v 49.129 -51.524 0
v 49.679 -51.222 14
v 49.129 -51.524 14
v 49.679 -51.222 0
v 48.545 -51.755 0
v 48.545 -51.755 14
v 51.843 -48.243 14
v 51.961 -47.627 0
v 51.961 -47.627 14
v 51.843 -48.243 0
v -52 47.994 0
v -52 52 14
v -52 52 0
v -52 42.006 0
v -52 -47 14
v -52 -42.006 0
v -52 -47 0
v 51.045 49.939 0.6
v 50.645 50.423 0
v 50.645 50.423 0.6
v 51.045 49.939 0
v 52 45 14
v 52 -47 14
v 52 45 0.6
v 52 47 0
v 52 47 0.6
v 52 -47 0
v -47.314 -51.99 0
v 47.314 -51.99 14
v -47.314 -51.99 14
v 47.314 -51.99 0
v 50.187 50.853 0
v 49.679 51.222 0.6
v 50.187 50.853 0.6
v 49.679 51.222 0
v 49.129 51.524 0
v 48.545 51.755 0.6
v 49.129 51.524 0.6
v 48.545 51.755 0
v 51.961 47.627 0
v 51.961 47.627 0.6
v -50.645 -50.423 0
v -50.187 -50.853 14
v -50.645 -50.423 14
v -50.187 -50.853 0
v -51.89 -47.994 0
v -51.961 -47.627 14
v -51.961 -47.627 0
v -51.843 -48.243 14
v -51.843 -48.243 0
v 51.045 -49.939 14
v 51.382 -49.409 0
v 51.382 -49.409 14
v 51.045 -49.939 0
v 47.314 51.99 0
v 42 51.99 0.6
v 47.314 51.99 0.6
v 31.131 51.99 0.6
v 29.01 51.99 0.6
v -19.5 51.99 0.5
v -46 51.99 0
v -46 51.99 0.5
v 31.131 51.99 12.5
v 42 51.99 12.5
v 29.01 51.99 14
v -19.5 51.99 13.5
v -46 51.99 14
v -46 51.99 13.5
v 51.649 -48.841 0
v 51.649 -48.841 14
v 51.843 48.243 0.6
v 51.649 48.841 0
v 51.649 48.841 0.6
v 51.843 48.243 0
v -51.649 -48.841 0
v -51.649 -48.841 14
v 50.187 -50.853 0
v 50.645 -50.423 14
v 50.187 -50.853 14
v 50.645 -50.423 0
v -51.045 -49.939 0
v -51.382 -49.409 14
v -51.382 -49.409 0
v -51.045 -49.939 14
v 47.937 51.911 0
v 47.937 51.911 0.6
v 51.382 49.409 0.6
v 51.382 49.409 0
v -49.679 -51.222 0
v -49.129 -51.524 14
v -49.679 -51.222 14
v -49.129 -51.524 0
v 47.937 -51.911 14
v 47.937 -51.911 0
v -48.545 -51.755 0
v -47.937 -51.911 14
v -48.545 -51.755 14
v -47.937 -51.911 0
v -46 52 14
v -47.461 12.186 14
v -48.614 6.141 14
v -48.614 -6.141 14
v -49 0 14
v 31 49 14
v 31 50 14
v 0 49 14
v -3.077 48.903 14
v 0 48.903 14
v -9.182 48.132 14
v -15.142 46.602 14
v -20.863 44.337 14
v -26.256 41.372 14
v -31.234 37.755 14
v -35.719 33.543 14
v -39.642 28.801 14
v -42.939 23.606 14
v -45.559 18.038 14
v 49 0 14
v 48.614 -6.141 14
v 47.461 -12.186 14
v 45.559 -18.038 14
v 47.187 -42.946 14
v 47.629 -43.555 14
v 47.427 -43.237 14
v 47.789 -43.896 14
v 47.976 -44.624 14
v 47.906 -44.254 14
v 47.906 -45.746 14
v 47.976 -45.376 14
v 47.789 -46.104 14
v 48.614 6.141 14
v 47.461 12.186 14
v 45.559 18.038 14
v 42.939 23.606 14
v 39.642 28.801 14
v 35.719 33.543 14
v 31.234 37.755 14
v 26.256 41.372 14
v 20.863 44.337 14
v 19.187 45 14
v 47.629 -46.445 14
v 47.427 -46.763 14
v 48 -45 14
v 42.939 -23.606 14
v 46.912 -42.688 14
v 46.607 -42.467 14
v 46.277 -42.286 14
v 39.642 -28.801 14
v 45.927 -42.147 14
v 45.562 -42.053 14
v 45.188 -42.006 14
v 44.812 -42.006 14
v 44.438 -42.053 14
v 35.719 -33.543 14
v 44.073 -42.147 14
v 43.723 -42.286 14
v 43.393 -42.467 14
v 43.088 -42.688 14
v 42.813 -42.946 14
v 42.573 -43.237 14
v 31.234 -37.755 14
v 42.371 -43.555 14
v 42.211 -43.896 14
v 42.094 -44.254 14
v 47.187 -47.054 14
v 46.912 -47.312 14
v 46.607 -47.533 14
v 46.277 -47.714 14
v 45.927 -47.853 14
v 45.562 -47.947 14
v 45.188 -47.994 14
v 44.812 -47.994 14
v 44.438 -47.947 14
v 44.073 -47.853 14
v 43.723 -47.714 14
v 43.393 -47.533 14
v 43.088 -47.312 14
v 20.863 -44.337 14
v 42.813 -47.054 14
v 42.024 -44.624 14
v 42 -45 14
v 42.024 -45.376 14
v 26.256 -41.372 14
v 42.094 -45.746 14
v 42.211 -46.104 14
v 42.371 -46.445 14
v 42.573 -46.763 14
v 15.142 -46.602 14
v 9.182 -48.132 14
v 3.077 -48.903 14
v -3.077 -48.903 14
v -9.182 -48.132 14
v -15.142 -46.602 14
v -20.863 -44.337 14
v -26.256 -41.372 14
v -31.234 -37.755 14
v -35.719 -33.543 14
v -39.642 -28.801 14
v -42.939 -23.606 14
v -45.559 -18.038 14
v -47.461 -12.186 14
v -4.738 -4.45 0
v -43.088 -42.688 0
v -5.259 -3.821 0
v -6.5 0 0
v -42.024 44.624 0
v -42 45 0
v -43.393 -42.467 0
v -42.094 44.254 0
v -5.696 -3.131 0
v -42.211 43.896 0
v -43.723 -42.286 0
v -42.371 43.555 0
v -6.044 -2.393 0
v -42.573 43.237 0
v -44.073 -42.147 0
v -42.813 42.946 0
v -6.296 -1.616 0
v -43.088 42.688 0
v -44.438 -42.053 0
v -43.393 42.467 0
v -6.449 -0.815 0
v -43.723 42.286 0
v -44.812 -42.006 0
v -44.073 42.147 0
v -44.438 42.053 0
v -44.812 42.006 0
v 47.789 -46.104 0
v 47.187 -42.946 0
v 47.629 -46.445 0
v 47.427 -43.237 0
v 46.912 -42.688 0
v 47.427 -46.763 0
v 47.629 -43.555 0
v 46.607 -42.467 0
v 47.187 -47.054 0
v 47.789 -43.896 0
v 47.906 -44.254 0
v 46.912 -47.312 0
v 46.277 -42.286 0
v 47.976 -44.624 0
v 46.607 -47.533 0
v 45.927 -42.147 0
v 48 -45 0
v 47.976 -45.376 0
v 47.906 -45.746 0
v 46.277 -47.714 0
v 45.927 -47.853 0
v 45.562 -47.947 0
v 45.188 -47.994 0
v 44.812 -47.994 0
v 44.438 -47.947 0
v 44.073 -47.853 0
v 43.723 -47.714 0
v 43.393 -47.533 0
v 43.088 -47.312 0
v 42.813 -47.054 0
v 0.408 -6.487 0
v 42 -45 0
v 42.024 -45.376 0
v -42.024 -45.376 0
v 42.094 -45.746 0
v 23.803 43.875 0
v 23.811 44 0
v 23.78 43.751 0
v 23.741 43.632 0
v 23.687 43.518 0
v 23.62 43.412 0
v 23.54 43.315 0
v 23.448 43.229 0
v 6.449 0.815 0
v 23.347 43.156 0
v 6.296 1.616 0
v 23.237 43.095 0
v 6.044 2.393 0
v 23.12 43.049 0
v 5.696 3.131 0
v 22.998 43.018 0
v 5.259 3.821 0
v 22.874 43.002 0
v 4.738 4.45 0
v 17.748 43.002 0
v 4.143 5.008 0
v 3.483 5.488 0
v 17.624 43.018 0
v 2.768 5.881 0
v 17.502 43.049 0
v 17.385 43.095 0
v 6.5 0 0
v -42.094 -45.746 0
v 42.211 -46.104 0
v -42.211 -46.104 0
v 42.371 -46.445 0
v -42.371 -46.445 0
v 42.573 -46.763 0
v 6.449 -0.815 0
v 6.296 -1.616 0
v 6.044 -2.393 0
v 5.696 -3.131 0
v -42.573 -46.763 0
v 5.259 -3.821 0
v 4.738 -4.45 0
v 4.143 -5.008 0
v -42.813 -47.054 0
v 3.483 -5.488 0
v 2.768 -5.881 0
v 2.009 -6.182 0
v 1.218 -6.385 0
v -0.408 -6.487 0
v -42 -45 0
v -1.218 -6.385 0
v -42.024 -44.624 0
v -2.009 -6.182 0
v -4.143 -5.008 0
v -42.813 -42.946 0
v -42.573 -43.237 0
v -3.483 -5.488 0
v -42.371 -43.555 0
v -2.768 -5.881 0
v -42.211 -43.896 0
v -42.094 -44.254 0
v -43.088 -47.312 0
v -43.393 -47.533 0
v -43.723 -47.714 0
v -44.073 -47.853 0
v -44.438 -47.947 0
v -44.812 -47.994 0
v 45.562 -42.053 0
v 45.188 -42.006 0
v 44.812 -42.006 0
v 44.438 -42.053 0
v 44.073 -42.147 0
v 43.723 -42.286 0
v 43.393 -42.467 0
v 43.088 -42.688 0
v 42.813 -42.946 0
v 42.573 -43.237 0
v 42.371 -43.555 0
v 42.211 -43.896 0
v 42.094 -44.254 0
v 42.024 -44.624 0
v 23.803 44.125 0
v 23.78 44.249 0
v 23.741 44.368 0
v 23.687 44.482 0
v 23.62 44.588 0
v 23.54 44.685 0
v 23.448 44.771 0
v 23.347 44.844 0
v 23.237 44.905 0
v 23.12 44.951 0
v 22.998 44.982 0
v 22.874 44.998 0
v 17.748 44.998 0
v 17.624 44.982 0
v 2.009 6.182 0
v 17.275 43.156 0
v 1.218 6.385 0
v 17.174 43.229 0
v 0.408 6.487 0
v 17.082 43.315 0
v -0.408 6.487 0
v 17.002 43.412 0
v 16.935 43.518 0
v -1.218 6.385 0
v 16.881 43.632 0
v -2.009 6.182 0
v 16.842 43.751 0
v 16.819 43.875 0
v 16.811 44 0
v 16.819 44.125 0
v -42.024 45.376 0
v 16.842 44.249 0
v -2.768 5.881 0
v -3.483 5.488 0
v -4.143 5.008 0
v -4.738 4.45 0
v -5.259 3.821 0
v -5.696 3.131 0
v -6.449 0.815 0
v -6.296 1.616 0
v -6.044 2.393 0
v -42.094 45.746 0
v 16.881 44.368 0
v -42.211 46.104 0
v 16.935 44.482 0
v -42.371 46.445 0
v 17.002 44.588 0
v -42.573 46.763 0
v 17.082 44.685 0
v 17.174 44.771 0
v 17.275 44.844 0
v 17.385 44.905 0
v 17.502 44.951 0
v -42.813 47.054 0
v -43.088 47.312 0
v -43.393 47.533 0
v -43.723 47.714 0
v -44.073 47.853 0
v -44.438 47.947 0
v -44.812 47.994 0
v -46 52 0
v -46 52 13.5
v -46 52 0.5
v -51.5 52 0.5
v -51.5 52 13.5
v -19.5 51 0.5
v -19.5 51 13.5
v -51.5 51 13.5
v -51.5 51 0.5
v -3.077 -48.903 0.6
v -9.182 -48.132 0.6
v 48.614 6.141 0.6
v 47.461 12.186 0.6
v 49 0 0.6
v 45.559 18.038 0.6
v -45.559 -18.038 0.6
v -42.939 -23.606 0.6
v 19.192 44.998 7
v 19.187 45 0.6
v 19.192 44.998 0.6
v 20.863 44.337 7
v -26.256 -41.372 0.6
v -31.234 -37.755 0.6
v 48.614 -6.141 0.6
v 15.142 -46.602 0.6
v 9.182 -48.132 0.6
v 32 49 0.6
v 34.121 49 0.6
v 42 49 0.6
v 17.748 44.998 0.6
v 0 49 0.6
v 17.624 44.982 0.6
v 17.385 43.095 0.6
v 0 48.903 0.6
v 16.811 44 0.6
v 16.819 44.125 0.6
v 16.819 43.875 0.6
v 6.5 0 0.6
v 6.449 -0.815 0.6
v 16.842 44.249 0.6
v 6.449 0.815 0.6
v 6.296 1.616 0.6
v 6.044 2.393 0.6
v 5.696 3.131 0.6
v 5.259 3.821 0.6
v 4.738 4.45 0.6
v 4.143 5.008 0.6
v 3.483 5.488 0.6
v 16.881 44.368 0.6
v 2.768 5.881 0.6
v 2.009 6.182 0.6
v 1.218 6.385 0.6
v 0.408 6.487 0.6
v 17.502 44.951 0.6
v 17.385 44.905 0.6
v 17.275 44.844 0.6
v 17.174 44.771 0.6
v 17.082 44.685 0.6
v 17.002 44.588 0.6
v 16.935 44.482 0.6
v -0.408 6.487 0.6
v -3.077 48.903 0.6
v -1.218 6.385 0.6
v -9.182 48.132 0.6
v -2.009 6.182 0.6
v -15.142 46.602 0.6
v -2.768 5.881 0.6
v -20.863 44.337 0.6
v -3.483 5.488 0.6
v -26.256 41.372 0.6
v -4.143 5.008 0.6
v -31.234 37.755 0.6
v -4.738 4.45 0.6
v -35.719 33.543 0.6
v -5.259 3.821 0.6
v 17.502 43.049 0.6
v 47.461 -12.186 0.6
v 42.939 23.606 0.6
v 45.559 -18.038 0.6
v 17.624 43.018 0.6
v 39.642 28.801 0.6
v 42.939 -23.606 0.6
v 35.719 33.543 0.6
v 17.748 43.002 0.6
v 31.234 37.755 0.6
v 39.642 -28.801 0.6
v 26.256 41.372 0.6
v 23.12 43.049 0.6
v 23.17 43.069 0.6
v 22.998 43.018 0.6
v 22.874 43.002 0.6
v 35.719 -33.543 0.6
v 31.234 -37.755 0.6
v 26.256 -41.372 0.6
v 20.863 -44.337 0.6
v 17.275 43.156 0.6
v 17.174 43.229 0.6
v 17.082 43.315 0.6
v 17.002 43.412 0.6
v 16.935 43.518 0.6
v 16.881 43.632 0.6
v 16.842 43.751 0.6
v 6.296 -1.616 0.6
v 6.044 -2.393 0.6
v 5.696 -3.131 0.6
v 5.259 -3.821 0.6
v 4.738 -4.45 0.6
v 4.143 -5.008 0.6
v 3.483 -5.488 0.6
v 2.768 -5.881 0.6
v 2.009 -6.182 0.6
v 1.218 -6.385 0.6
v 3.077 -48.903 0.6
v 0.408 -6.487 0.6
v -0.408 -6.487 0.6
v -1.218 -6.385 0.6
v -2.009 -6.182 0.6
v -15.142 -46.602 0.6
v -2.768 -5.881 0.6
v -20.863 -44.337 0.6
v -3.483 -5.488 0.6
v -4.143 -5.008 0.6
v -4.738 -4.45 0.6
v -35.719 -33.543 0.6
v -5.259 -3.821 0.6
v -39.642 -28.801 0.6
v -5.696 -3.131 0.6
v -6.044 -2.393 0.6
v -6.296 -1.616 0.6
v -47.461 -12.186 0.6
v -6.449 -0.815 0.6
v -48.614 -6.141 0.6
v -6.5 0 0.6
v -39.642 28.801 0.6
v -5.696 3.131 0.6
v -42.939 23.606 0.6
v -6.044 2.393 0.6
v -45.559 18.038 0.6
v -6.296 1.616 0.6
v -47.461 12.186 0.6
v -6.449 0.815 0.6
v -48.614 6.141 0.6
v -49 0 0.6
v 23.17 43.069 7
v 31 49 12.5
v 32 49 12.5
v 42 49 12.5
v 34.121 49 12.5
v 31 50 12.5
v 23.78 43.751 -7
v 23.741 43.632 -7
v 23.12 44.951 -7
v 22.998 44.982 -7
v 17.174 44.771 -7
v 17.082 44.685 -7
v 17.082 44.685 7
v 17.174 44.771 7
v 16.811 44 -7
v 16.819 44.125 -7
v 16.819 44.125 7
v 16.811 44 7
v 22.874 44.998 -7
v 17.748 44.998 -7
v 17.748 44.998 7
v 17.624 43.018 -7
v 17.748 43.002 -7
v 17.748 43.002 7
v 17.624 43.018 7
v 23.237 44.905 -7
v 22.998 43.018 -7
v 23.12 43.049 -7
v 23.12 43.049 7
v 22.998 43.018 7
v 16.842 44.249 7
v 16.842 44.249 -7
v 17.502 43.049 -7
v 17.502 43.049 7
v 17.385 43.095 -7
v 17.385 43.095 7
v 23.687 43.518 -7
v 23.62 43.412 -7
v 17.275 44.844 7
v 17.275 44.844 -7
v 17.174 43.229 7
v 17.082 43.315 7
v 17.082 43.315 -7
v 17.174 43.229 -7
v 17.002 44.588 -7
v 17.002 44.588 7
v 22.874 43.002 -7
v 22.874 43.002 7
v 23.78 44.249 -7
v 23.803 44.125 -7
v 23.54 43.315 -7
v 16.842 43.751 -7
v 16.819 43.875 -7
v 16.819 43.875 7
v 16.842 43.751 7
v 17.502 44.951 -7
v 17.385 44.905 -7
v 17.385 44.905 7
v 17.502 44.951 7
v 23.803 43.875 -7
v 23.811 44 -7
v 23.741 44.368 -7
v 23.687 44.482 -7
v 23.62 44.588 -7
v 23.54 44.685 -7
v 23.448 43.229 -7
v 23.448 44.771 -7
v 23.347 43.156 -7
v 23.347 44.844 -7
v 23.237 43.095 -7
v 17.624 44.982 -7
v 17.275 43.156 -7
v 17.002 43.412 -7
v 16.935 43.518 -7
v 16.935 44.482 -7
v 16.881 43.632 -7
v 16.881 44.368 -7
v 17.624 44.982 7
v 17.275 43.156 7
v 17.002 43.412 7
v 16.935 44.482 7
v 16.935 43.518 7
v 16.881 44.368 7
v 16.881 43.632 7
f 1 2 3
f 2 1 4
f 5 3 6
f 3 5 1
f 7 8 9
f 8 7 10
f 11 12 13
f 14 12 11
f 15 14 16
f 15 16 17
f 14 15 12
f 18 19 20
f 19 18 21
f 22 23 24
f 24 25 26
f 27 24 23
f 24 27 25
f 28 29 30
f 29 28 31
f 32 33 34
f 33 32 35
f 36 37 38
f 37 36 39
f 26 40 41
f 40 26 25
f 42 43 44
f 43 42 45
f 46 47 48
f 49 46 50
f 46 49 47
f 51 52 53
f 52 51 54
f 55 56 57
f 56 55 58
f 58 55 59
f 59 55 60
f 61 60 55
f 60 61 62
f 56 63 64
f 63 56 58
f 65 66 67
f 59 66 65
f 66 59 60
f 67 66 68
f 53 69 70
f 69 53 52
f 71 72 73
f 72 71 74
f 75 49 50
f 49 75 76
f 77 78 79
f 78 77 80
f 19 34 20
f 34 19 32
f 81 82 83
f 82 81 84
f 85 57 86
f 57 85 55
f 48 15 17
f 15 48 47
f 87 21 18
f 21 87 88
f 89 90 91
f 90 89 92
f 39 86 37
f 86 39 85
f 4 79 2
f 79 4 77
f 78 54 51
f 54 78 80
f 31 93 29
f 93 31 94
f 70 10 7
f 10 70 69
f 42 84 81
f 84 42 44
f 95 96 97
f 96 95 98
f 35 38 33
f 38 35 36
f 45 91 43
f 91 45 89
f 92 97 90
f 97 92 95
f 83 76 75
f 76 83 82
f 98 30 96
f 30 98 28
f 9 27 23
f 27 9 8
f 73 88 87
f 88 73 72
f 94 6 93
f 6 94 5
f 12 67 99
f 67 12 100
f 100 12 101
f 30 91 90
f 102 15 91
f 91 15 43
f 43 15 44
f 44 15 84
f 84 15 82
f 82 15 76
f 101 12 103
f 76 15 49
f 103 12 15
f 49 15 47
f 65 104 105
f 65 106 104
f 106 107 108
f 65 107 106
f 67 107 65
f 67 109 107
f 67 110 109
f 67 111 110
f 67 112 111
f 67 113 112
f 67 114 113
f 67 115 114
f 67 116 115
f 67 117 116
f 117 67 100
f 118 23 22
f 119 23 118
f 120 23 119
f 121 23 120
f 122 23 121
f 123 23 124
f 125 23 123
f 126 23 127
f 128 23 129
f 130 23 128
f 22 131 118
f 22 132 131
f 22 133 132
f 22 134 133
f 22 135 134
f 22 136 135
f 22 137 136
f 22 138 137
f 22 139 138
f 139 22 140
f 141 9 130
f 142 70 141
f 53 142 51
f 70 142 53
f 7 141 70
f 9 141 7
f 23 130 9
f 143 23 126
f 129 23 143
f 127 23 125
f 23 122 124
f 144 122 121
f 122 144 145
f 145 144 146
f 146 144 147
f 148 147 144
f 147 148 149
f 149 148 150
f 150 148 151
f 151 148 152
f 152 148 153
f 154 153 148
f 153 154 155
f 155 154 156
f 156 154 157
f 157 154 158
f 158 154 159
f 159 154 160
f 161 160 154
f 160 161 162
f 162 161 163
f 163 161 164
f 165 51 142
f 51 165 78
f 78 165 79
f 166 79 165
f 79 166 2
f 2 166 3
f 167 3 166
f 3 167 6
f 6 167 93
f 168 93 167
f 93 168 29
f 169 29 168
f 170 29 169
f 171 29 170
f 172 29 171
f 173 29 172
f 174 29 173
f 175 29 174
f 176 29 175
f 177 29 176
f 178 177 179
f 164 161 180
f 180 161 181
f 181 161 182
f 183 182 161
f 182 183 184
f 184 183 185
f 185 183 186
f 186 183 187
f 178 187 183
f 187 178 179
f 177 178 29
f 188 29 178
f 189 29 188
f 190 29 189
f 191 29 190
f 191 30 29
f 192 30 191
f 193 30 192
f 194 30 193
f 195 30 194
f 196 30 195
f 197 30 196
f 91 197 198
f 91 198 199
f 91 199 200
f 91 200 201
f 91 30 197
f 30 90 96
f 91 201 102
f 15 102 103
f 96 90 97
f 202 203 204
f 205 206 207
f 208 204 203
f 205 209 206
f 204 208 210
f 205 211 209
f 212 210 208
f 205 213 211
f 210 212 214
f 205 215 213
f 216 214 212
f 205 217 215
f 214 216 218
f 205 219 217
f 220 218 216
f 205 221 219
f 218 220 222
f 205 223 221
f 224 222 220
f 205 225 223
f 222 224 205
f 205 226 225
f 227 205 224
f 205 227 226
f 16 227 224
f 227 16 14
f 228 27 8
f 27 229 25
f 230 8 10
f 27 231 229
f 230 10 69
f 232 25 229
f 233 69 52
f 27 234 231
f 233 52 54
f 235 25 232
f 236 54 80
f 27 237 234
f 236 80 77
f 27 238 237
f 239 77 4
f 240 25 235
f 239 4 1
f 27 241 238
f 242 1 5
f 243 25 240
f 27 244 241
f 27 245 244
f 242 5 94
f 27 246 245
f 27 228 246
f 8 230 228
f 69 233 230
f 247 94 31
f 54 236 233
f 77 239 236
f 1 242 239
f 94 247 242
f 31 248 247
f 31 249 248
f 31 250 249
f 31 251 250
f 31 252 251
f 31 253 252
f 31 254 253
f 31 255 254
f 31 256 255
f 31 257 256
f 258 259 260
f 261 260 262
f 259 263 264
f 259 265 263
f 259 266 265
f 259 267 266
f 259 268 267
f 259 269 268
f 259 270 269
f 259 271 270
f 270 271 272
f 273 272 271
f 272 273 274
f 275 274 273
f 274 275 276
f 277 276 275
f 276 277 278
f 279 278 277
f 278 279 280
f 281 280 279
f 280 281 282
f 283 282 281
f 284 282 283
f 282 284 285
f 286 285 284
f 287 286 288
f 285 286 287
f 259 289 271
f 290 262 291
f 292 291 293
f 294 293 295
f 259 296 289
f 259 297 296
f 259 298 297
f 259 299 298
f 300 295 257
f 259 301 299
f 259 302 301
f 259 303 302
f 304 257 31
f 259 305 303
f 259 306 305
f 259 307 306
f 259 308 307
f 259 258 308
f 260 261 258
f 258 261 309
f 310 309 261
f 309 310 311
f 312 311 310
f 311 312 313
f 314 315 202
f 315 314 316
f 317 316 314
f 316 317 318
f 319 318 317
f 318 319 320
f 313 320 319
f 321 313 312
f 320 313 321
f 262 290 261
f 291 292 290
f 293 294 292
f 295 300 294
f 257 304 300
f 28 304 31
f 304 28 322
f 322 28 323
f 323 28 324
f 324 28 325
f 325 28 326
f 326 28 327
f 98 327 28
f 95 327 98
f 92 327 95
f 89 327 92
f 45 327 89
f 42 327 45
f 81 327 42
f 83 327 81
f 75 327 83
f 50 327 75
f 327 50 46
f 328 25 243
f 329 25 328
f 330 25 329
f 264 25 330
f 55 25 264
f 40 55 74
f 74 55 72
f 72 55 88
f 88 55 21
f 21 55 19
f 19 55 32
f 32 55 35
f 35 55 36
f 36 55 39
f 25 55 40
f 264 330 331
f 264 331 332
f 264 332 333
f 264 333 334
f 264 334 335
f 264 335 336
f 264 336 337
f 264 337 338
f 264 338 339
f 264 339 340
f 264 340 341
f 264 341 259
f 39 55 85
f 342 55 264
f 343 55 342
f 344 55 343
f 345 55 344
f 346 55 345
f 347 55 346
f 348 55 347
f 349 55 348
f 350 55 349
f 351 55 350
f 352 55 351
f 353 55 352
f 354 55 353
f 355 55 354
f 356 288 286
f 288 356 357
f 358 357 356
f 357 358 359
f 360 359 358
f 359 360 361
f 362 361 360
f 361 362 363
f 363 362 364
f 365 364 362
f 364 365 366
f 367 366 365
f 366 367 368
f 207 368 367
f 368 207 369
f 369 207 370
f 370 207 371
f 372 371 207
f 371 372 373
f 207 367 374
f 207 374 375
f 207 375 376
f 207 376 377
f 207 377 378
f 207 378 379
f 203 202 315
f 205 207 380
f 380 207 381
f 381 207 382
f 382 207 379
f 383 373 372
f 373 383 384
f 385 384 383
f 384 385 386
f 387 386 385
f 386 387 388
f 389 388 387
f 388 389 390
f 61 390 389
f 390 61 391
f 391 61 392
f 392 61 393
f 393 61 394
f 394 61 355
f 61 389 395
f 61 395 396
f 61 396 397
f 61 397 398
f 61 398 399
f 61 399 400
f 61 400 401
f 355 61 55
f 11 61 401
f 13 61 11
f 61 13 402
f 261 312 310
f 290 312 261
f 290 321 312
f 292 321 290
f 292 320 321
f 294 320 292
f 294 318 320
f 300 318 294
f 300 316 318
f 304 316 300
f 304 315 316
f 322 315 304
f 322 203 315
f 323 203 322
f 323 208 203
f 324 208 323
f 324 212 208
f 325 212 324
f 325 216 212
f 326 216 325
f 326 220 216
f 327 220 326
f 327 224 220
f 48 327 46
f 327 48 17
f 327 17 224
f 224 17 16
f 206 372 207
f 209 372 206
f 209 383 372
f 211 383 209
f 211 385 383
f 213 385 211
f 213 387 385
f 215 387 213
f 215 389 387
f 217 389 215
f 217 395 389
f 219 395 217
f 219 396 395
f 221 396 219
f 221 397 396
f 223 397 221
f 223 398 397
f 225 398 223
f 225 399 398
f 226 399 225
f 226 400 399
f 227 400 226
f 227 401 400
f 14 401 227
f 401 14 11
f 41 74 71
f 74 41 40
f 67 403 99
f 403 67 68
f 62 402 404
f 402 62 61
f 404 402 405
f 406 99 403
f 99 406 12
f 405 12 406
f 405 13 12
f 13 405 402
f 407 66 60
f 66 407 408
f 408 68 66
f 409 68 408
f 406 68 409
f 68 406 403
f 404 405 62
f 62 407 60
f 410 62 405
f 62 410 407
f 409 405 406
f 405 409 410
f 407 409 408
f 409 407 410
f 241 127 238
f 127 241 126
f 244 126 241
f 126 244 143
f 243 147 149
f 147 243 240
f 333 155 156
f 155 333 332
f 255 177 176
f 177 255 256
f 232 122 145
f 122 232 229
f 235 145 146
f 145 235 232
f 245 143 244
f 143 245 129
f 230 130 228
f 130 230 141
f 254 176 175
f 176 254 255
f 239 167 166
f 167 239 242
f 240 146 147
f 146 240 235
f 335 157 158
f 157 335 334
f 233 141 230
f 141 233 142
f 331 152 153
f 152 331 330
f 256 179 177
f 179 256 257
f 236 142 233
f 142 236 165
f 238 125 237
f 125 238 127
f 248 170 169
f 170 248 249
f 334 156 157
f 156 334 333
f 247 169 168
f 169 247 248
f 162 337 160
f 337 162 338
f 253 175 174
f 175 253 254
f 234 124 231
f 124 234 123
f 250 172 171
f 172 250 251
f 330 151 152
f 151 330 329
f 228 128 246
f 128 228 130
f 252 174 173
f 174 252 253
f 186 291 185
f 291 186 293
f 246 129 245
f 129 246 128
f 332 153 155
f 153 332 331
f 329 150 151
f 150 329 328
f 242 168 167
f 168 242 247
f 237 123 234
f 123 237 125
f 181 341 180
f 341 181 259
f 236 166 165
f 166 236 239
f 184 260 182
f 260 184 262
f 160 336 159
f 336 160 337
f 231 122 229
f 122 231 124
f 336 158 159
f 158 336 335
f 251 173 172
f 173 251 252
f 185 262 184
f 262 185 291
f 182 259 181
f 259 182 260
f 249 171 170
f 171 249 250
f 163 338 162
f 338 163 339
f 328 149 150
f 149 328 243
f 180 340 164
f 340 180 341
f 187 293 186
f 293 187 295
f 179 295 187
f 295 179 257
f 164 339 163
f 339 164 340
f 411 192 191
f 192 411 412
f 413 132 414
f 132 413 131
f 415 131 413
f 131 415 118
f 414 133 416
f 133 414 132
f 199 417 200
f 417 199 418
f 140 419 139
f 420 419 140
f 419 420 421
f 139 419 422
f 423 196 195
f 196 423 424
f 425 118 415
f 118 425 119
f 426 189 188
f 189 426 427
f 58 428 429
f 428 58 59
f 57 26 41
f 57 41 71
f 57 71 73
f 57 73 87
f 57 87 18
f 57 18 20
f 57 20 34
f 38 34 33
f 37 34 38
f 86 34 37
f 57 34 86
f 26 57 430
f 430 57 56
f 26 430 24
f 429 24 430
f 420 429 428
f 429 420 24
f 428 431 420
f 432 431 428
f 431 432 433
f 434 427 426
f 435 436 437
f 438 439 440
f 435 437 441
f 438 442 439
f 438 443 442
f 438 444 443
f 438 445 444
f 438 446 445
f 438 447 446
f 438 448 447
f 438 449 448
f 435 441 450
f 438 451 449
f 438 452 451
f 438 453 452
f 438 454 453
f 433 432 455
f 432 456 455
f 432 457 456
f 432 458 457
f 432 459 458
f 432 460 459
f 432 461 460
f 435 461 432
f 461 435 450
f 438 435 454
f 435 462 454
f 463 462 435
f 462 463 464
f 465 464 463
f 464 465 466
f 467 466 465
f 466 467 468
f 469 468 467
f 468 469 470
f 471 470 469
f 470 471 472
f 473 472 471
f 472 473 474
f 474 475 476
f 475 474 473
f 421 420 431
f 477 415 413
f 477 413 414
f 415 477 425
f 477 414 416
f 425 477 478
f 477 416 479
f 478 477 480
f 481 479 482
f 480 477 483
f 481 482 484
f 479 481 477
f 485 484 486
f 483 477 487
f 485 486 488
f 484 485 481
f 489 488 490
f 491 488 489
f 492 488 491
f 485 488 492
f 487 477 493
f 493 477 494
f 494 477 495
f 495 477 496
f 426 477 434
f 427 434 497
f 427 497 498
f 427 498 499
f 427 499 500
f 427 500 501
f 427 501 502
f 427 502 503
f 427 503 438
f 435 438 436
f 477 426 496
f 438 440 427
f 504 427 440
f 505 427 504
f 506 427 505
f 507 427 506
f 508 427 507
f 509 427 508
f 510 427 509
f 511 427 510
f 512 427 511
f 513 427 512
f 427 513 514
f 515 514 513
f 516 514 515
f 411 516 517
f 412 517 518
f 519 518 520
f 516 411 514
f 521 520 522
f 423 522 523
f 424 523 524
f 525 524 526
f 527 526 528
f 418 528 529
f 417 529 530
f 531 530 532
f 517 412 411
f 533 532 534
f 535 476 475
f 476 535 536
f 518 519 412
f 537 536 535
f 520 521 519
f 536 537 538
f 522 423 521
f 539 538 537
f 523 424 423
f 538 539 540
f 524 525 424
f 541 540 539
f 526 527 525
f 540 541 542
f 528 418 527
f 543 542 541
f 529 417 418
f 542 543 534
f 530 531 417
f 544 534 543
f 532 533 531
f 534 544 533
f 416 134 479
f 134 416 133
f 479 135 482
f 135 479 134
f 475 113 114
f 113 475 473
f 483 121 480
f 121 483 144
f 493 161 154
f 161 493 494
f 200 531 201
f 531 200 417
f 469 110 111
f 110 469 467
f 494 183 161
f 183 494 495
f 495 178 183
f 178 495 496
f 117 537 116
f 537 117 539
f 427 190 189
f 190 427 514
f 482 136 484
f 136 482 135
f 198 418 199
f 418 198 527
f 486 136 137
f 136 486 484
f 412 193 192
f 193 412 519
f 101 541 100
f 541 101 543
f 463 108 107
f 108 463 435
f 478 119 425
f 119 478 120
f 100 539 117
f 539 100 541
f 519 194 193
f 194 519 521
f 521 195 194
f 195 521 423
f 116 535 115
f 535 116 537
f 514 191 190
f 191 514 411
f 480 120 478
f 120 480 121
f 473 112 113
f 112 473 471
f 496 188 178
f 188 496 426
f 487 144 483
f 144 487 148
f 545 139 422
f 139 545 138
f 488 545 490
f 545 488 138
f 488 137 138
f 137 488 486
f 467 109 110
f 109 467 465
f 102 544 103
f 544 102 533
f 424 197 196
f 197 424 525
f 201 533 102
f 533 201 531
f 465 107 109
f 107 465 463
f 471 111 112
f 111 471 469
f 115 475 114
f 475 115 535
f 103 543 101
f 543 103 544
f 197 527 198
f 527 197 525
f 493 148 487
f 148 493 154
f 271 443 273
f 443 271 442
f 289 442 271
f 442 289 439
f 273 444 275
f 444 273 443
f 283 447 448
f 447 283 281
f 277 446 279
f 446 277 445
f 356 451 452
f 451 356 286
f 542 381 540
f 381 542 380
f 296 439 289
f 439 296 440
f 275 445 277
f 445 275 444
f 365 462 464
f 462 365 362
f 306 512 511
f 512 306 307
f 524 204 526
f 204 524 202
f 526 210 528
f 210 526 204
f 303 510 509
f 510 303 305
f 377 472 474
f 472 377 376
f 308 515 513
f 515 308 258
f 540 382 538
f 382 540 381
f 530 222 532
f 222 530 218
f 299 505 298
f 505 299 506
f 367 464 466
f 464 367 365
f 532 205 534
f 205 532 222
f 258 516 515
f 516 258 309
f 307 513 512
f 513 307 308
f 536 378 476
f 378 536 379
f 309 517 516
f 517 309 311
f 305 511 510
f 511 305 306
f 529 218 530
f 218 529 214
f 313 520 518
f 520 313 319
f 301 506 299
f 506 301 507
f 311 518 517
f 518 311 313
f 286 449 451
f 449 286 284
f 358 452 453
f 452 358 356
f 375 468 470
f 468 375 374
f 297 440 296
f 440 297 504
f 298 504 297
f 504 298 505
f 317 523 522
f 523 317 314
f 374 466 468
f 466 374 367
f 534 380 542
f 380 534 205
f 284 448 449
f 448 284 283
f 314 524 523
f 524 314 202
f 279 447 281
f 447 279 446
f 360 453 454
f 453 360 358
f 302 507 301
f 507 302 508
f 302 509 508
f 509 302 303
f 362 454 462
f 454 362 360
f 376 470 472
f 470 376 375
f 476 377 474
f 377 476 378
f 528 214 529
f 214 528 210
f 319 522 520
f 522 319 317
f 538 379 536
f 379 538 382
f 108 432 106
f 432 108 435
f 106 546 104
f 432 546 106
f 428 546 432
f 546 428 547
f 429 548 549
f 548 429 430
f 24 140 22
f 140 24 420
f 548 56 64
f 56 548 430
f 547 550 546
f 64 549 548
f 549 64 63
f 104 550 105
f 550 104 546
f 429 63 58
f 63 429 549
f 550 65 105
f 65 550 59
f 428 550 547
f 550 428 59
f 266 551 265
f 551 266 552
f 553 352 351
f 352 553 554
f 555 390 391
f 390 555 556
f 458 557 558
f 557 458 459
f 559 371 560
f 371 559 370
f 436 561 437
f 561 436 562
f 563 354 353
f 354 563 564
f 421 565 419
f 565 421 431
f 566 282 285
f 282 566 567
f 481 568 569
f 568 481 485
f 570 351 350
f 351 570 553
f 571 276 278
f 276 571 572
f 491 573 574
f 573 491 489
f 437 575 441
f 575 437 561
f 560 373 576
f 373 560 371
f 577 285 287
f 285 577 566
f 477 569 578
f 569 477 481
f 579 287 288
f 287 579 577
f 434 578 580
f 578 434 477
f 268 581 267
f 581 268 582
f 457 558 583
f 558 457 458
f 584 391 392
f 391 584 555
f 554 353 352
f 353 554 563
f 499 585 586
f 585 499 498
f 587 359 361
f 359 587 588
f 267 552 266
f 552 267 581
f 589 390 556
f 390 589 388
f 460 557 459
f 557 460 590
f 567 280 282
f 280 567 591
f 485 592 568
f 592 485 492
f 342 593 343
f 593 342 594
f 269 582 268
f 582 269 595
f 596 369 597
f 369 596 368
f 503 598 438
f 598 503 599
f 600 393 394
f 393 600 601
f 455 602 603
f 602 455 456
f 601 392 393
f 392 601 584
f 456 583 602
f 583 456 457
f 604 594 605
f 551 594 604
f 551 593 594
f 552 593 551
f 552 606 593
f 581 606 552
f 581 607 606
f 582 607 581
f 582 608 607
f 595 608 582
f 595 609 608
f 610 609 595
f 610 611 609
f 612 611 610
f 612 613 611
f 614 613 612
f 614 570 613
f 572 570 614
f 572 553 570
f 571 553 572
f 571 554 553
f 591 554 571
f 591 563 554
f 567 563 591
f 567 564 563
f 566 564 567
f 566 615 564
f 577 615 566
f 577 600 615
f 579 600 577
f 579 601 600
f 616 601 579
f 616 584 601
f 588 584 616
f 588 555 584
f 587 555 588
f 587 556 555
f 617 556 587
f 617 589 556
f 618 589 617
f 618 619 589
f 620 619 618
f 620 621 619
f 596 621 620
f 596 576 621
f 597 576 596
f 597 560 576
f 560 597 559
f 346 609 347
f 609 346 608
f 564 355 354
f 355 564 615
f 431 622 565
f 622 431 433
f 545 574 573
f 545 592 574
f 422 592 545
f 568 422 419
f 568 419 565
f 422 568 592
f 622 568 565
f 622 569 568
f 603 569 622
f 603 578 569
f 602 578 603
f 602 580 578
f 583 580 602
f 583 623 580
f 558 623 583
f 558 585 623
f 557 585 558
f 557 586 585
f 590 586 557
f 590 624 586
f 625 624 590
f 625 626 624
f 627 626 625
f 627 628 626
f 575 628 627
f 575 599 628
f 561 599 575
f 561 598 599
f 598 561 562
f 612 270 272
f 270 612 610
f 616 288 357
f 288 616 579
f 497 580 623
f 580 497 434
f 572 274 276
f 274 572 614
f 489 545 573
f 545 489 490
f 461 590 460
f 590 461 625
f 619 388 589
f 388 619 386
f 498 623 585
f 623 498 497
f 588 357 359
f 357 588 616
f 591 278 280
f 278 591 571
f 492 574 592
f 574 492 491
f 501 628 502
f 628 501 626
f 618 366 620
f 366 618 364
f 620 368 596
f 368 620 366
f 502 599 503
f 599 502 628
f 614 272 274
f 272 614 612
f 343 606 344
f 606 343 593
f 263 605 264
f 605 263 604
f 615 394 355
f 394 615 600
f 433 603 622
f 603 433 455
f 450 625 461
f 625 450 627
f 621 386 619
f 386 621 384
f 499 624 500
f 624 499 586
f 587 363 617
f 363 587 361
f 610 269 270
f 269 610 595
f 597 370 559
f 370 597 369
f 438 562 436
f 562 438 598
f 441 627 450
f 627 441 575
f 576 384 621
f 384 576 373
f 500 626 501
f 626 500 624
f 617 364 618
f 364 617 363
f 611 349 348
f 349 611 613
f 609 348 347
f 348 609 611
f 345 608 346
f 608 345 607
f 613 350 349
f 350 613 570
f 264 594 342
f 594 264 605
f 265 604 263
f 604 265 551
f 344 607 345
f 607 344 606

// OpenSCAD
$fn = 50;


union() {
	difference() {
		union() {
			hull() {
				translate(v = [-47.0000000000, 47.0000000000, 0]) {
					cylinder(h = 14, r = 5);
				}
				translate(v = [47.0000000000, 47.0000000000, 0]) {
					cylinder(h = 14, r = 5);
				}
				translate(v = [-47.0000000000, -47.0000000000, 0]) {
					cylinder(h = 14, r = 5);
				}
				translate(v = [47.0000000000, -47.0000000000, 0]) {
					cylinder(h = 14, r = 5);
				}
			}
			translate(v = [-52.0000000000, 46.0000000000, 0]) {
				cube(size = [6, 6, 14]);
			}
		}
		union() {
			translate(v = [-52.5000000000, -45.0000000000, -250.0000000000]) {
				rotate(a = [0, 0, 0]) {
					difference() {
						union() {
							hull() {
								translate(v = [7.5000000000, 0, 0]) {
									cylinder(h = 250, r = 3.0000000000, r1 = 3.0000000000, r2 = 3.0000000000);
								}
								translate(v = [-7.5000000000, 0, 0]) {
									cylinder(h = 250, r = 3.0000000000, r1 = 3.0000000000, r2 = 3.0000000000);
								}
							}
						}
						union();
					}
				}
			}
			translate(v = [-52.5000000000, 45.0000000000, -250.0000000000]) {
				rotate(a = [0, 0, 0]) {
					difference() {
						union() {
							hull() {
								translate(v = [7.5000000000, 0, 0]) {
									cylinder(h = 250, r = 3.0000000000, r1 = 3.0000000000, r2 = 3.0000000000);
								}
								translate(v = [-7.5000000000, 0, 0]) {
									cylinder(h = 250, r = 3.0000000000, r1 = 3.0000000000, r2 = 3.0000000000);
								}
							}
						}
						union();
					}
				}
			}
			translate(v = [-51.5000000000, 51.0000000000, 0.5000000000]) {
				cube(size = [32, 1, 13.0000000000]);
			}
			translate(v = [45.0000000000, -45.0000000000, 0]) {
				cylinder(h = 100, r = 3.0000000000);
			}
			translate(v = [0, 0, 0.6000000000]) {
				cylinder(h = 16.4000000000, r = 49.0000000000);
			}
			translate(v = [0, 0, -7.0000000000]) {
				cylinder(h = 14, r = 6.5000000000);
			}
			translate(v = [0.0000000000, 45.0000000000, 0.6000000000]) {
				cube(size = [52.0000000000, 4, 16.4000000000]);
			}
			translate(v = [42.0000000000, 45.0000000000, 0.6000000000]) {
				cube(size = [10, 7, 16.4000000000]);
			}
			translate(v = [31.0000000000, 45.0000000000, 12.5000000000]) {
				cube(size = [21, 7, 1.5000000000]);
			}
			translate(v = [28.2500000000, 52.7500000000, 0.6000000000]) {
				rotate(a = [0, 0, -45]) {
					cube(size = [7.5000000000, 1.5000000000, 16.4000000000]);
				}
			}
			translate(v = [11.0610000000, 43.0000000000, 0.6000000000]) {
				cube(size = [7.5000000000, 2, 13.4000000000]);
			}
		}
	}
	union() {
		translate(v = [20.3110000000, 44.0000000000, -7.0000000000]) {
			rotate(a = [0, 0, 0]) {
				difference() {
					union() {
						#hull() {
							#translate(v = [2.5000000000, 0, 0]) {
								cylinder(h = 14, r = 1.0000000000, r1 = 1.0000000000, r2 = 1.0000000000);
							}
							#translate(v = [-2.5000000000, 0, 0]) {
								cylinder(h = 14, r = 1.0000000000, r1 = 1.0000000000, r2 = 1.0000000000);
							}
						}
					}
					union();
				}
			}
		}
	}
}
